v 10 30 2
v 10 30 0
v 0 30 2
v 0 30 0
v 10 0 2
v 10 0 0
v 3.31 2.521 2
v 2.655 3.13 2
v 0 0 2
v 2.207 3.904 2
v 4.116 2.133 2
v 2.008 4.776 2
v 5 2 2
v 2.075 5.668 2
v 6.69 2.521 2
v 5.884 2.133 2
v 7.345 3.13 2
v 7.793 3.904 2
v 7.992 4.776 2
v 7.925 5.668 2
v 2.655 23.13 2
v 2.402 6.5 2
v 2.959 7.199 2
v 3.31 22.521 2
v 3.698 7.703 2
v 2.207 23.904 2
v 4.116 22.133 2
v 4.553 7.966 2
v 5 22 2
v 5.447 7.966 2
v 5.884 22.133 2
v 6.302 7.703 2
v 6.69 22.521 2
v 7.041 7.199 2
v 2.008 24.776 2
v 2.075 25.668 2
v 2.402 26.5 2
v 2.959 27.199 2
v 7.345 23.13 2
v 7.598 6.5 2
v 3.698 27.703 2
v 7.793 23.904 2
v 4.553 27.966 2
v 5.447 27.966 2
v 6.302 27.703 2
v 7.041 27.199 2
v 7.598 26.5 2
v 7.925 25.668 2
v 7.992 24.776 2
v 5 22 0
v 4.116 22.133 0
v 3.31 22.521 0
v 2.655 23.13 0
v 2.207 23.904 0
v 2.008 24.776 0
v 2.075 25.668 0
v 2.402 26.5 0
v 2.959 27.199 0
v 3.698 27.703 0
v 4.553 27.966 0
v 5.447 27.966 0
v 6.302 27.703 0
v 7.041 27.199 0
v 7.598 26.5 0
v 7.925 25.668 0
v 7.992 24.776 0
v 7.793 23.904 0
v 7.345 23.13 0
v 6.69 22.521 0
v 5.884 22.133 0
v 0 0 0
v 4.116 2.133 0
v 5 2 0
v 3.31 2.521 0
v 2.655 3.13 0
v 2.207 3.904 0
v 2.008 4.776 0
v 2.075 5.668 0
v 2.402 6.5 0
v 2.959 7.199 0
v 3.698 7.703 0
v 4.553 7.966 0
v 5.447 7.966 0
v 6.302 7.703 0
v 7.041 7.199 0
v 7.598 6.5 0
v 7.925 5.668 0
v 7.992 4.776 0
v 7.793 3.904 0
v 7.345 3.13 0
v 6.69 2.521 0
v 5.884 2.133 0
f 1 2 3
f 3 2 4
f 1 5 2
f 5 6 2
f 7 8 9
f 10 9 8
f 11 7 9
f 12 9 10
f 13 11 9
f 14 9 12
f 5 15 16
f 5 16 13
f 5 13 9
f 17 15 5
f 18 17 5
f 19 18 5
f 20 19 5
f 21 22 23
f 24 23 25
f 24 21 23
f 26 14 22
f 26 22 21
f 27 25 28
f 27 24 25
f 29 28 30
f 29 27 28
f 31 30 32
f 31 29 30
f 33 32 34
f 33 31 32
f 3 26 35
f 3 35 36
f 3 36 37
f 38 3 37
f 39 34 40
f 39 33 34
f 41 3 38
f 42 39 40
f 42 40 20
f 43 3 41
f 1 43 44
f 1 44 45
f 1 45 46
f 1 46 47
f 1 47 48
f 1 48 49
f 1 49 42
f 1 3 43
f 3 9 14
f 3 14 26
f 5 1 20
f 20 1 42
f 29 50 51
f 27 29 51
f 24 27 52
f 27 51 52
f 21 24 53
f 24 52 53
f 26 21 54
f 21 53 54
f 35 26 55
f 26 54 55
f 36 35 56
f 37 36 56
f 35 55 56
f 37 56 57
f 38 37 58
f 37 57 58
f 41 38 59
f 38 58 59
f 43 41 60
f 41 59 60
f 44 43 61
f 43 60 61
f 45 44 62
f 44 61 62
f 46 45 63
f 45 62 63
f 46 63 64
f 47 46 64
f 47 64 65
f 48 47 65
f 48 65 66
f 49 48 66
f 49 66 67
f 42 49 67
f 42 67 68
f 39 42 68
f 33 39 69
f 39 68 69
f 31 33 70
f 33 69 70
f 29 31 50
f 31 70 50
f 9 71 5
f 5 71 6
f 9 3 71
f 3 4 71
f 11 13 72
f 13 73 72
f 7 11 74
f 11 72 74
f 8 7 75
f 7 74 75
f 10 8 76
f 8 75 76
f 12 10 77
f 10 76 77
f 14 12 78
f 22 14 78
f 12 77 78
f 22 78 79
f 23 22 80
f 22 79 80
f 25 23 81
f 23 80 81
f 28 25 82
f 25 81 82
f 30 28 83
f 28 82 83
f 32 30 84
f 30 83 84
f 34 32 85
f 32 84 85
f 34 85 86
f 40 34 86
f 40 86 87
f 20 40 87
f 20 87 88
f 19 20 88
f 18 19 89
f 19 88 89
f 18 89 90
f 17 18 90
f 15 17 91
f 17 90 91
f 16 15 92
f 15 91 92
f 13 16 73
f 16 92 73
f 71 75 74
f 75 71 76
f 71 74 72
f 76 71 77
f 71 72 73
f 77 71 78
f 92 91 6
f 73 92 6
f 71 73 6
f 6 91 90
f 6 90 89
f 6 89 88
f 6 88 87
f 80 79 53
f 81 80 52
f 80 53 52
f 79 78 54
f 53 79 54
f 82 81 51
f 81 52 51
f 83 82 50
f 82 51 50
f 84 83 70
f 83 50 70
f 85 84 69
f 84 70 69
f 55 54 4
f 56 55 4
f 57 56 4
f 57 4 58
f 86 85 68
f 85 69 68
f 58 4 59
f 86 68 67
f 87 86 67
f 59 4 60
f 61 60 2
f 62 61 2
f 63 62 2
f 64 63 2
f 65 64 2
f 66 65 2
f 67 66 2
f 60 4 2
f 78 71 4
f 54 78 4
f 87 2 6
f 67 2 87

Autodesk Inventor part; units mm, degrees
ref_plane "YZ Plane" through (0, 0, 0) normal (1, 0, 0) x (0, 1, 0)
ref_plane "XZ Plane" through (0, 0, 0) normal (0, 1, 0) x (-1, 0, 0)
ref_plane "XY Plane" through (0, 0, 0) normal (0, 0, 1) x (1, 0, 0)
sketch "スケッチ1" plane through (0, 0, 0) normal (0, 0, 1) x (1, 0, 0)
  line L0 (0, 0) -> (10, 0)
  line L1 (10, 0) -> (10, 30)
  line L2 (10, 30) -> (0, 30)
  line L3 (0, 30) -> (0, 0)
  dimension "d0" = 10
  dimension "d1" = 30
extrude "押し出し1" add sketch "スケッチ1" along normal blind 2
sketch "スケッチ2" plane through (0, 0, 2) normal (0, 0, 1) x (1, 0, 0)
  line L0 (0, 0) -> (10, 0) projected
  line L1 (10, 30) -> (0, 30) projected
  line L2 (0, 30) -> (0, 0) projected
  point P0 (5, 5)
  point P1 (5, 25)
  dimension "d4" = 5
  dimension "d12" = 5
  dimension "d13" = 5
hole "穴1" at (5, 5, 2) at (5, 25, 2) direction (0, 0, -1) diameter 6 end through all
properties part number "指先"
